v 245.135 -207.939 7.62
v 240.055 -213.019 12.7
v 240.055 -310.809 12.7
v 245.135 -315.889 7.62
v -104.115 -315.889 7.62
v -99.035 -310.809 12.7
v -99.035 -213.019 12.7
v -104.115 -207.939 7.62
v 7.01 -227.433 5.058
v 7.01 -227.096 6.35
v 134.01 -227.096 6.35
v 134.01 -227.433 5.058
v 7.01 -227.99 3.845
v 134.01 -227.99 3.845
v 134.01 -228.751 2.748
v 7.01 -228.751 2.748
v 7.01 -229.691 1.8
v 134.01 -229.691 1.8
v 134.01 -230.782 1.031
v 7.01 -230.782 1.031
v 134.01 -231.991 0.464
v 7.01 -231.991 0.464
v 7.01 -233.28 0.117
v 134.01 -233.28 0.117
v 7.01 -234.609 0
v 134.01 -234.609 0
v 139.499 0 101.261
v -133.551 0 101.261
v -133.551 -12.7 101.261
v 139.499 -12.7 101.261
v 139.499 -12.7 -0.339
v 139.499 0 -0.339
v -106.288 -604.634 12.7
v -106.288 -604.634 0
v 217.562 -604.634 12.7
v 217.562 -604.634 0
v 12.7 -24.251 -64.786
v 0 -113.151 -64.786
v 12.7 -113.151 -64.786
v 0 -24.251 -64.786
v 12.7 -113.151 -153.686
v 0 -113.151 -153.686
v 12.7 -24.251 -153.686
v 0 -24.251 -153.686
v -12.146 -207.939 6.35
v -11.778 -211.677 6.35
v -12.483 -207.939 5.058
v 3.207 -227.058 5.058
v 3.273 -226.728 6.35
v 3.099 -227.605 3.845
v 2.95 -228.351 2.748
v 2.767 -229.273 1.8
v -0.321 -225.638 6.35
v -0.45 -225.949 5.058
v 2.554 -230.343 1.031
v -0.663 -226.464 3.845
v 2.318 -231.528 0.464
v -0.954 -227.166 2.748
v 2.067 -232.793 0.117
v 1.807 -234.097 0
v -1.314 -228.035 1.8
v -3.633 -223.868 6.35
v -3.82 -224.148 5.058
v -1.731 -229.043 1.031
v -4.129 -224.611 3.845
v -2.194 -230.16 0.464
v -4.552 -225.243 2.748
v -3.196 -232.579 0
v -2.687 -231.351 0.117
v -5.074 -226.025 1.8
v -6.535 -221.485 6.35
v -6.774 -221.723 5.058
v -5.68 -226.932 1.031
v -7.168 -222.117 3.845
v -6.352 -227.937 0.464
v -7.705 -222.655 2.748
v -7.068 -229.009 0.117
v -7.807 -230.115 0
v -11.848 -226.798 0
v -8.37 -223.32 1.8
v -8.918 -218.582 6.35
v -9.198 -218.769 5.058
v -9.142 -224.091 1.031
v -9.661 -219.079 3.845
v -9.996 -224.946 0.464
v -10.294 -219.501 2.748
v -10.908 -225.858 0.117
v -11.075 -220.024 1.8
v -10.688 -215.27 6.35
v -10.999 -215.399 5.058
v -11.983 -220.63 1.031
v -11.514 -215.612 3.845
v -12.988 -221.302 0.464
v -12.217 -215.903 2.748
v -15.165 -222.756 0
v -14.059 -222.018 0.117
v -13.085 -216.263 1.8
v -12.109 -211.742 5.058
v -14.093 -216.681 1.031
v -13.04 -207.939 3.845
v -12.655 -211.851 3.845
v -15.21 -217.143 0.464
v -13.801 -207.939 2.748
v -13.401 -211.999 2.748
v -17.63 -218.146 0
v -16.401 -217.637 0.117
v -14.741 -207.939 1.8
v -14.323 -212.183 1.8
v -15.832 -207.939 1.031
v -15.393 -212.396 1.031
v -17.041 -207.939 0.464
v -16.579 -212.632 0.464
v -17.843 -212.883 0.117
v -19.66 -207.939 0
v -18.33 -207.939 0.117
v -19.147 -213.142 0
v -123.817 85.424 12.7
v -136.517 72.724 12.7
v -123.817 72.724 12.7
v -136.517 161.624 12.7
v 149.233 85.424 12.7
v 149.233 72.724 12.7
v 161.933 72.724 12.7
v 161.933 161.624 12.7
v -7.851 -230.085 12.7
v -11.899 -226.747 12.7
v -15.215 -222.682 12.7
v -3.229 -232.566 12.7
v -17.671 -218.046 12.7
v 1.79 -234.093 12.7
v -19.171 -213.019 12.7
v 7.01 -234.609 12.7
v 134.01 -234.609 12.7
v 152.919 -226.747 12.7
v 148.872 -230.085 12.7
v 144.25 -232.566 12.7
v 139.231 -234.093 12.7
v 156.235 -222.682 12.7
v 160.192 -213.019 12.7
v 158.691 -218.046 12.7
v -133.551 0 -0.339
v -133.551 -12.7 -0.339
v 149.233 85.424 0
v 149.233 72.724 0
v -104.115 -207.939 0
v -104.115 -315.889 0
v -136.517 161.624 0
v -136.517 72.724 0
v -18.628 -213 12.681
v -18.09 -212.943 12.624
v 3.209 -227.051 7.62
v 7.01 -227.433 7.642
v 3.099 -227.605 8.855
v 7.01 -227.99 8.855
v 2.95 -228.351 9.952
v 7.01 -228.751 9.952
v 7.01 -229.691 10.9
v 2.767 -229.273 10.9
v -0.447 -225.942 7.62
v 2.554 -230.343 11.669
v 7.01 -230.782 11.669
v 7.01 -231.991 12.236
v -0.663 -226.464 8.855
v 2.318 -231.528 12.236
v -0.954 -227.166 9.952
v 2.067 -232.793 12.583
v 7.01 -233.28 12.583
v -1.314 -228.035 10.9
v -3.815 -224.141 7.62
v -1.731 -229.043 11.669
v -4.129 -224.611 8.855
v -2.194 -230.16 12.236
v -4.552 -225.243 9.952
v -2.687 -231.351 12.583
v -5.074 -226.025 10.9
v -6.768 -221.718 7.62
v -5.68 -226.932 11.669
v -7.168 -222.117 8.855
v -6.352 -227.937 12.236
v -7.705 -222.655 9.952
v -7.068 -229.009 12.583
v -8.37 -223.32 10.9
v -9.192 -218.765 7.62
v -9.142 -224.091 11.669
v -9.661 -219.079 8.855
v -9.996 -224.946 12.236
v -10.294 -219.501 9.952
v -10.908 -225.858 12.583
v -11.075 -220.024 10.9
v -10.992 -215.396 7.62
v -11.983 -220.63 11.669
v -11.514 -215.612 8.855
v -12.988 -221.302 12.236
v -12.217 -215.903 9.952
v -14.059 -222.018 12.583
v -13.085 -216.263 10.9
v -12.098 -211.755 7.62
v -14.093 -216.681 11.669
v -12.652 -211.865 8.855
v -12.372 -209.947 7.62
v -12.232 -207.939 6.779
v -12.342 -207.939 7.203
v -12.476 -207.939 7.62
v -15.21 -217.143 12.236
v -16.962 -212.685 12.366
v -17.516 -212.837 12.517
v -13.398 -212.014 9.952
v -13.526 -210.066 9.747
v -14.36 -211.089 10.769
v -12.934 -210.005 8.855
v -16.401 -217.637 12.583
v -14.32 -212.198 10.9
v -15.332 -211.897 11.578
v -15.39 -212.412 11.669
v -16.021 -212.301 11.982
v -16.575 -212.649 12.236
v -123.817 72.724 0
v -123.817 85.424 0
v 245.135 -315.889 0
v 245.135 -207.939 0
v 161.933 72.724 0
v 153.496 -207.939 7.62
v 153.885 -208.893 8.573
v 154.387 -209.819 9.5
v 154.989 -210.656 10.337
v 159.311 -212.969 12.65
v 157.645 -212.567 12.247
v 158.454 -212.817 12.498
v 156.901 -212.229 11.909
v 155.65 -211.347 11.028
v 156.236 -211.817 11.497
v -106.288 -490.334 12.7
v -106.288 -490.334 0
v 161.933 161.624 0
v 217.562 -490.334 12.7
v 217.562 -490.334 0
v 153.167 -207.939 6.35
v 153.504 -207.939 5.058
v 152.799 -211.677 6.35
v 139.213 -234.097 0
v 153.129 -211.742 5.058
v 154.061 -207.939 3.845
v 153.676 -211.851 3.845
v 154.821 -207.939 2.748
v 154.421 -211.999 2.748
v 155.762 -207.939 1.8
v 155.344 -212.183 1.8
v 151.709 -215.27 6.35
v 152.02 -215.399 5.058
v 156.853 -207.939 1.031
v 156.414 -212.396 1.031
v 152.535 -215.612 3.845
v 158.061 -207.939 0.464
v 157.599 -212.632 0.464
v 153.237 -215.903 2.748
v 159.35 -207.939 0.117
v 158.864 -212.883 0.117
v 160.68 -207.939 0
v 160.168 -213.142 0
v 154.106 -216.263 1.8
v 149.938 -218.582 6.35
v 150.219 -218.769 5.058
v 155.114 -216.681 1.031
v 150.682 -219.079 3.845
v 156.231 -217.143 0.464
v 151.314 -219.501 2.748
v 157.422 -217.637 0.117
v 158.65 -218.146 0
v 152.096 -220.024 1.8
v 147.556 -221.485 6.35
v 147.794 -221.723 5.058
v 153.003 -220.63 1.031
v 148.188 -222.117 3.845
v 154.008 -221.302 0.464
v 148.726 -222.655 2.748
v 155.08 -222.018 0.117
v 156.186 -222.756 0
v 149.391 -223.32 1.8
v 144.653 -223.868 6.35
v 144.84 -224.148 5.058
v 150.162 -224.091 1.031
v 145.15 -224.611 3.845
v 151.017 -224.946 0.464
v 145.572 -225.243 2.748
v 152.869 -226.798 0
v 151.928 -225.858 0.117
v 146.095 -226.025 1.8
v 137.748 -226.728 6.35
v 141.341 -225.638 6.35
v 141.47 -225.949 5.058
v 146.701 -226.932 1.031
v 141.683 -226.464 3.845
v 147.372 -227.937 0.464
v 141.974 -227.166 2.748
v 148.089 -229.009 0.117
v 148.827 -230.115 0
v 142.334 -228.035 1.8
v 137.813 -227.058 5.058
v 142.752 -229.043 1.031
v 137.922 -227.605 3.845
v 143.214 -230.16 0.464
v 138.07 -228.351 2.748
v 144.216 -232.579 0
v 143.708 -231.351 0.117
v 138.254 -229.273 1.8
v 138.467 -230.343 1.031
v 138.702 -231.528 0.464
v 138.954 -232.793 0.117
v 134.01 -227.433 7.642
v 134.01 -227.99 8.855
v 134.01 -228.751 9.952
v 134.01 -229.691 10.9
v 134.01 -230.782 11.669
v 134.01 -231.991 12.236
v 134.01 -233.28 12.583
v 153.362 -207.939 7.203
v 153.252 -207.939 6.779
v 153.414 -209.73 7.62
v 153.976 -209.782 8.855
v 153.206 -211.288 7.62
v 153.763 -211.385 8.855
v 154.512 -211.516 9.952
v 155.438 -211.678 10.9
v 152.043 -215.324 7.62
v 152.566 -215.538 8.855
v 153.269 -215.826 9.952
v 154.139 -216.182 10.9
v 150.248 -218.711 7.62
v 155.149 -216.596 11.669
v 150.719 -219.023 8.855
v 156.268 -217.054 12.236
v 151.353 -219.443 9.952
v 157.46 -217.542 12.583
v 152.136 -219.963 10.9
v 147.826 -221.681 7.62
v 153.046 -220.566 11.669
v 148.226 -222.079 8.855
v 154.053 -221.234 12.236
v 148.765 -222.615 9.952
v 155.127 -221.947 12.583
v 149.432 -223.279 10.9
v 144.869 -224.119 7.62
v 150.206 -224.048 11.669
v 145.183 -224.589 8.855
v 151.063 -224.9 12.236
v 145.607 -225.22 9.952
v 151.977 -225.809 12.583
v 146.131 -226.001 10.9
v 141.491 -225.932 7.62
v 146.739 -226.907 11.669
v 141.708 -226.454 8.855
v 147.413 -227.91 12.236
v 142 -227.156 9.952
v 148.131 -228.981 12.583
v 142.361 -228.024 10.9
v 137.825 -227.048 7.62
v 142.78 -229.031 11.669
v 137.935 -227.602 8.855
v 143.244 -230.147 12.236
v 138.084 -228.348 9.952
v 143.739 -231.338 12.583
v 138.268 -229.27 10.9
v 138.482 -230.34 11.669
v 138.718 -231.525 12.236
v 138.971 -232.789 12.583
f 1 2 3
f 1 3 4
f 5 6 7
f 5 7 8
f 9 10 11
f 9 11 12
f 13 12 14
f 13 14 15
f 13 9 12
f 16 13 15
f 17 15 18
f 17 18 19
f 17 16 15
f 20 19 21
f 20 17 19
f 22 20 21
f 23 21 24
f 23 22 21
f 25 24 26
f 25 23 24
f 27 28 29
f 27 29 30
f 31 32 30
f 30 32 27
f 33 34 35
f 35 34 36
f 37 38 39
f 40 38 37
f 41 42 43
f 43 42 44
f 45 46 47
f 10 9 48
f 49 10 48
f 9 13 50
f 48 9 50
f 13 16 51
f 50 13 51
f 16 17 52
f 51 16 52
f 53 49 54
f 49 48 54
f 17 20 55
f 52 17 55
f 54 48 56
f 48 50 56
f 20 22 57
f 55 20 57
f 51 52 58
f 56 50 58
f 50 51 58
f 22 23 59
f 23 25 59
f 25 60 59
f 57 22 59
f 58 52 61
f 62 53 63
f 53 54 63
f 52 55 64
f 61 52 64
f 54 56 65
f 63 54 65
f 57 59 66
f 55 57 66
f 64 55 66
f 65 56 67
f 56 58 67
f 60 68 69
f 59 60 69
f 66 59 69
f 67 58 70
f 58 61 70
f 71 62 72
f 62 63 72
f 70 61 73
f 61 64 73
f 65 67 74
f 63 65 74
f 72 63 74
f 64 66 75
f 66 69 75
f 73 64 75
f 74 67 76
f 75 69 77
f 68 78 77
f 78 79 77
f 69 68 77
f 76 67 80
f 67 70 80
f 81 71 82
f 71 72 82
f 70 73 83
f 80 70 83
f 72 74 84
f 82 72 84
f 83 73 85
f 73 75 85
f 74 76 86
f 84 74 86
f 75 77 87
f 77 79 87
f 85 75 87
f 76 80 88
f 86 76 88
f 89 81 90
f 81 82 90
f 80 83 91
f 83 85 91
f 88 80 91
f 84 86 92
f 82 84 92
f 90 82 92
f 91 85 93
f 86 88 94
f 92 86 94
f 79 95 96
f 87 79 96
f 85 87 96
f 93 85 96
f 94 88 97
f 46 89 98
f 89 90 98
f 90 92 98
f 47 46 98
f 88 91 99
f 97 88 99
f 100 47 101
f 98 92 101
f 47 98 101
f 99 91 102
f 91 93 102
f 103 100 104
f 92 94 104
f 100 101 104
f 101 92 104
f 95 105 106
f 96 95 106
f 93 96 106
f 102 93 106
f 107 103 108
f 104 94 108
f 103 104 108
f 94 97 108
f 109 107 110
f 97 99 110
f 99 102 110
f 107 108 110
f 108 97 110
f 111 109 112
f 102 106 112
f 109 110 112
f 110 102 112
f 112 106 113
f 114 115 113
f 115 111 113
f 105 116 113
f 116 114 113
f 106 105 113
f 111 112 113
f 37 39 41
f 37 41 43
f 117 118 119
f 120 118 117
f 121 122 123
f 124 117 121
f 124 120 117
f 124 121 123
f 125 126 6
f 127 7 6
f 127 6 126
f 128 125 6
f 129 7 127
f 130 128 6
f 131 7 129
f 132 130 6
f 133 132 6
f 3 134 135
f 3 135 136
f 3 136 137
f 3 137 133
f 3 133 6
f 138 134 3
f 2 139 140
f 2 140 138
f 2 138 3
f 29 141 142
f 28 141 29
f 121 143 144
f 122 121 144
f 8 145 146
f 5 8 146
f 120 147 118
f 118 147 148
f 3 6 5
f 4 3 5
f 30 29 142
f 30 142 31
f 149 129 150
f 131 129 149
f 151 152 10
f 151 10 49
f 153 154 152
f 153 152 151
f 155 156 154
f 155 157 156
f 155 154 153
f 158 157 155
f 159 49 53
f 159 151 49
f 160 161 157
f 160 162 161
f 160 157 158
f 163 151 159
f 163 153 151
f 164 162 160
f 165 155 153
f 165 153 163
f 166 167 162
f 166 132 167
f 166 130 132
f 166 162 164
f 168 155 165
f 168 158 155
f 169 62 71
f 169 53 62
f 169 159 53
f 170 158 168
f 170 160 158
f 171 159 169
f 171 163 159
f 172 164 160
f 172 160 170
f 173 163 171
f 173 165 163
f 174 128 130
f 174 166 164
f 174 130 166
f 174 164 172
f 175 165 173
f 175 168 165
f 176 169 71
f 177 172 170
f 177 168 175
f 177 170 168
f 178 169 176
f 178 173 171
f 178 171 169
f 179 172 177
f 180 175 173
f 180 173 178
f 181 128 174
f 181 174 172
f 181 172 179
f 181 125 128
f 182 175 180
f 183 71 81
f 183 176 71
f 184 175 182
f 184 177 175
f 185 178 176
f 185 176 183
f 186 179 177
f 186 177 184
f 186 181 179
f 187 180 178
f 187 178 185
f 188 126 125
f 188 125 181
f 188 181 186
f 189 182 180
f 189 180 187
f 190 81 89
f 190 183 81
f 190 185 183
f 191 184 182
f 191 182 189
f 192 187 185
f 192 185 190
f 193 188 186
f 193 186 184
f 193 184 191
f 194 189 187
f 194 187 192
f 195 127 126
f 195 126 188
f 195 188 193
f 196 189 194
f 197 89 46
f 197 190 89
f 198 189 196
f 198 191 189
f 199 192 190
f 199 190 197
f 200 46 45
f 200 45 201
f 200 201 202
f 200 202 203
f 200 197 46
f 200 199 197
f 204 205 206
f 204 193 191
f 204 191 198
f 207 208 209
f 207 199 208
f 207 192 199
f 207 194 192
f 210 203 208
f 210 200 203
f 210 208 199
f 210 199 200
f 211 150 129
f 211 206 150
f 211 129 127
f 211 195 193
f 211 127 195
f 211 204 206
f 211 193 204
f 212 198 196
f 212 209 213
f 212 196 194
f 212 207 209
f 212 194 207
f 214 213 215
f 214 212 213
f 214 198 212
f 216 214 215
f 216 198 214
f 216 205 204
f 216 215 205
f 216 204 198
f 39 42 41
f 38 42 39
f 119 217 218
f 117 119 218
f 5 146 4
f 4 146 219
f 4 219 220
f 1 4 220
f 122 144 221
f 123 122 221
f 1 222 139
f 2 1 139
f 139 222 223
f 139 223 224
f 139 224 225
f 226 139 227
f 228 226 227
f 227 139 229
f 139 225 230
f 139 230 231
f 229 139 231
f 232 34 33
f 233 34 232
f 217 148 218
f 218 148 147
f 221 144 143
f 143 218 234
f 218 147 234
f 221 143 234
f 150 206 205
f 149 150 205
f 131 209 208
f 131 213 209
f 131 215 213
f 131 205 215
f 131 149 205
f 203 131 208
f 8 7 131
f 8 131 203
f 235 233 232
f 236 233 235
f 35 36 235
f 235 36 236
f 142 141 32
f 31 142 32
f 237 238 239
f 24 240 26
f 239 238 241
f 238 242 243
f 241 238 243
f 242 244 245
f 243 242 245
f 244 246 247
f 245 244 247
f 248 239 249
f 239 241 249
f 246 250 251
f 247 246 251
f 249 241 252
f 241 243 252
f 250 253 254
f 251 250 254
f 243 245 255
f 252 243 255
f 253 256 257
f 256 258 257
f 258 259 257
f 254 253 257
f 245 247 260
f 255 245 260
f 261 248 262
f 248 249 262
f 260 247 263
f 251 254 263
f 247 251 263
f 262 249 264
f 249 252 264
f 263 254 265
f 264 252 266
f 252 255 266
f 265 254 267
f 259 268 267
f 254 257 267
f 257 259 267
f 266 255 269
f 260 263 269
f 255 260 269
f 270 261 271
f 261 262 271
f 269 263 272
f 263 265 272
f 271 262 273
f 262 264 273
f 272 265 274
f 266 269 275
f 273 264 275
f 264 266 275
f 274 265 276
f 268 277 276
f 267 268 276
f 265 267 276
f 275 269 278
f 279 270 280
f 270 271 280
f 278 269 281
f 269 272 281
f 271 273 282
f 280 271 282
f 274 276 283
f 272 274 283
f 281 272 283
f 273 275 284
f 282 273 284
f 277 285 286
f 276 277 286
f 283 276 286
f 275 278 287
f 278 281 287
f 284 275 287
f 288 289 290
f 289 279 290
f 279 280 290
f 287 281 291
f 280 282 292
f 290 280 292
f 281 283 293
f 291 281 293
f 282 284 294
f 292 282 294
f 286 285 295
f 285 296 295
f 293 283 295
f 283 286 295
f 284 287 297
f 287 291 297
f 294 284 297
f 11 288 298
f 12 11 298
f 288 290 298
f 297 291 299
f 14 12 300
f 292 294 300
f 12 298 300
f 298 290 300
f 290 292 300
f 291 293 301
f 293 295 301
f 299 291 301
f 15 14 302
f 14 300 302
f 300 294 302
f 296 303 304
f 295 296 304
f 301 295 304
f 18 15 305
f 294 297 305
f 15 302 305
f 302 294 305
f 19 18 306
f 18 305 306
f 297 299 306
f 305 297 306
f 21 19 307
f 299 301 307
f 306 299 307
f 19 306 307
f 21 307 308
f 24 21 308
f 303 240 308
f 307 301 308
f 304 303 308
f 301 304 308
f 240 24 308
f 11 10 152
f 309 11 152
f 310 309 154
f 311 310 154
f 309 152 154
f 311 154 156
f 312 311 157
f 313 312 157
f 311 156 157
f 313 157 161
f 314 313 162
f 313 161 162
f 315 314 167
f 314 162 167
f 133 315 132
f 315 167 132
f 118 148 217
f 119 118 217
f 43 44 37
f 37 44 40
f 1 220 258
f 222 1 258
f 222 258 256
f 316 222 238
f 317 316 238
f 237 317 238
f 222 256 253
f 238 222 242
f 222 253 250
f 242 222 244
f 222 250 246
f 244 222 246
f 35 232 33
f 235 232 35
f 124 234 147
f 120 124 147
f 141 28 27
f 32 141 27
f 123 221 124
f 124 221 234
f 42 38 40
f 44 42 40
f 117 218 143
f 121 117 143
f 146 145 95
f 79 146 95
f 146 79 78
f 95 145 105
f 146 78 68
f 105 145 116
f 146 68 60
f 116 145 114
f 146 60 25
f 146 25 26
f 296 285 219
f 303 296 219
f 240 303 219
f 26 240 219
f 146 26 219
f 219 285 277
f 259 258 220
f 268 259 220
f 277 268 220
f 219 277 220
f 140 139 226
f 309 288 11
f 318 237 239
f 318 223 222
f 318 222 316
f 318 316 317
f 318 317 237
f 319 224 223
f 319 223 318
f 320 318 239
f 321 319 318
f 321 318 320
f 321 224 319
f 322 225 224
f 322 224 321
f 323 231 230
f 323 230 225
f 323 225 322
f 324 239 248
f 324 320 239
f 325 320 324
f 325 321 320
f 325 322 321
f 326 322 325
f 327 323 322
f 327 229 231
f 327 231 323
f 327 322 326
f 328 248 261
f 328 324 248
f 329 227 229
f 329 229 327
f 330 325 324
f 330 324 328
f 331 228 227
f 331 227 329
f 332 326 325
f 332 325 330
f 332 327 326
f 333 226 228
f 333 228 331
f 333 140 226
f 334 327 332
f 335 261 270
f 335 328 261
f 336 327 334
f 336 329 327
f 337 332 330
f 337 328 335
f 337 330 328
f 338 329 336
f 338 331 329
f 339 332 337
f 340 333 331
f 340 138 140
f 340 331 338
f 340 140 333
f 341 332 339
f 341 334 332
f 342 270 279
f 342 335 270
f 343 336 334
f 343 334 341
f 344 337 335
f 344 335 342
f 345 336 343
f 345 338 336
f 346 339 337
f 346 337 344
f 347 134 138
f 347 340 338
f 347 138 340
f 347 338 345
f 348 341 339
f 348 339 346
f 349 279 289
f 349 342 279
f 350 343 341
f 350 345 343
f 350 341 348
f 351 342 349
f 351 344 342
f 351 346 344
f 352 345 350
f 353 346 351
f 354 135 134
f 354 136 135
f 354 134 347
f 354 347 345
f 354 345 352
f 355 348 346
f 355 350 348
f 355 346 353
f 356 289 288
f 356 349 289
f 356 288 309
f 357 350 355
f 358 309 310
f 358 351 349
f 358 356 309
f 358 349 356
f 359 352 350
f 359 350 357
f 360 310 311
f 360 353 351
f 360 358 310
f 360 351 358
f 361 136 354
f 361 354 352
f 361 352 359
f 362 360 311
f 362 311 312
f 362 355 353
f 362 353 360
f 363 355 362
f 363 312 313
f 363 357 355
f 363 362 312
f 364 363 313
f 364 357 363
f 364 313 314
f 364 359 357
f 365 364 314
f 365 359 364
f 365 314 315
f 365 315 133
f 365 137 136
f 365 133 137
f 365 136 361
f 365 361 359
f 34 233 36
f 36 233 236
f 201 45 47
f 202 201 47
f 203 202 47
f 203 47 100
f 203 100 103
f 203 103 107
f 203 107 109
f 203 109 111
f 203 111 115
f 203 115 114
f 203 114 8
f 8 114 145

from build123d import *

# Parameters (mm, degrees)
F0_W         = 273.05
F0_H         = 101.6
F1_DEPTH     = 12.7
F3_DEPTH     = 12.7
F4_W         = 88.9
F4_H         = 88.9
F5_DEPTH     = 12.7
F7_DEPTH     = 12.7
F8_T1_DEPTH  = 127
F8_T4_ANGLE  = 147.318795695
F8_T6_ANGLE  = 147.318795695
F8_T8_ANGLE  = 147.318795695
F8_T10_ANGLE = 147.318795695
F9_T1_DEPTH  = 110.5832991577
F9_T3_DEPTH  = 134.0782991577
F9_T5_DEPTH  = 375.3782991577
F9_T7_DEPTH  = 110.5832991577
F10_W        = 323.85
F10_H        = 114.3
F11_DEPTH    = 12.7


# Not quite as in the source:
# - a fillet or chamfer that OpenCascade refuses, or shapes differently, is made with other operations: its cross-section is extruded or revolved along the edge and cut away or added


with BuildPart() as f1:
    # F0 (on Front) → F1 (new body)
    with BuildSketch(Plane.XZ):
        with Locations((2.9736794531, 50.4609997191)):
            Rectangle(F0_W, F0_H)
    extrude(amount=F1_DEPTH)


with BuildPart() as f3:
    # F2 (on Top) → F3 (new body)
    with BuildSketch(Plane.XY):
        Polygon((161.9328741789, 161.6237761021), (-136.5171258211, 161.6237761021), (-136.5171258211, 85.4237761021), (-136.5171258211, 72.7237761021), (-123.8171258211, 72.7237761021), (-123.8171258211, 85.4237761021), (149.2328741789, 85.4237761021), (149.2328741789, 72.7237761021), (161.9328741789, 72.7237761021), (161.9328741789, 85.4237761021), align=None)
    extrude(amount=F3_DEPTH)


with BuildPart() as f5:
    # F4 (on Right) → F5 (new body)
    with BuildSketch(Plane.YZ):
        with Locations((-68.700975406, -109.2356368899)):
            Rectangle(F4_W, F4_H)
    extrude(amount=F5_DEPTH)


with BuildPart() as f7:
    # F6 (on Top) → F7 (new body)
    with BuildSketch(Plane.XY):
        with BuildLine():
            Line((-12.0397317886, -207.9394155827), (-104.1147317886, -207.9394155827))
            Line((-104.1147317886, -207.9394155827), (-104.1147317886, -315.8894155827))
            Line((-104.1147317886, -315.8894155827), (245.1352682114, -315.8894155827))
            Line((245.1352682114, -315.8894155827), (245.1352682114, -207.9394155827))
            Line((245.1352682114, -207.9394155827), (153.0602682114, -207.9394155827))
            ThreePointArc((153.0602682114, -207.9394155827), (147.480652393, -221.4097997643), (134.0102682114, -226.9894155827))
            Line((134.0102682114, -226.9894155827), (7.0102682114, -226.9894155827))
            ThreePointArc((7.0102682114, -226.9894155827), (-6.4601159702, -221.4097997643), (-12.0397317886, -207.9394155827))
        make_face()
    extrude(amount=F7_DEPTH)

    # F8: fillet of radius 7.62 on 6 edges, made by hand

    # F8_s2 → F8_t1 (cut)
    with BuildSketch(Plane.YZ.offset(7.0102682114)):
        with BuildLine():
            ThreePointArc((-226.9894155827, 5.08), (-229.22126191, 10.4681536726), (-234.6094155827, 12.7))
            Line((-234.6094155827, 12.7), (-226.9894155827, 12.7))
            Line((-226.9894155827, 12.7), (-226.9894155827, 5.08))
        make_face()
        with BuildLine():
            ThreePointArc((-226.9894155827, 7.62), (-229.22126191, 2.2318463274), (-234.6094155827, 0))
            Line((-234.6094155827, 0), (-226.9894155827, 0))
            Line((-226.9894155827, 0), (-226.9894155827, 7.62))
        make_face()
    extrude(amount=F8_T1_DEPTH, mode=Mode.SUBTRACT)

    # F8_s3 → F8_t4 (revolve, cut)
    with BuildSketch(Plane(origin=(189.4426460264, -121.5322762083, 0), x_dir=(0, 0, 1), z_dir=(-0.8416879608, 0.5399642365, 0))):
        with BuildLine():
            ThreePointArc((7.62, -83.6093505), (2.2318463274, -81.3775041726), (0, -75.9893505))
            Line((0, -75.9893505), (0, -83.6093505))
            Line((0, -83.6093505), (7.62, -83.6093505))
        make_face()
    revolve(axis=Axis((134.0102682114, -207.9394155827, 0), (0, 0, -1)), revolution_arc=F8_T4_ANGLE, mode=Mode.SUBTRACT)

    # F8_s5 → F8_t6 (revolve, cut)
    with BuildSketch(Plane(origin=(189.4426460264, -121.5322762083, 0), x_dir=(0, 0, 1), z_dir=(-0.8416879608, 0.5399642365, 0))):
        with BuildLine():
            ThreePointArc((5.08, -83.6093505), (10.4681536726, -81.3775041726), (12.7, -75.9893505))
            Line((12.7, -75.9893505), (12.7, -83.6093505))
            Line((12.7, -83.6093505), (5.08, -83.6093505))
        make_face()
    revolve(axis=Axis((134.0102682114, -207.9394155827, 12.7), (0, 0, -1)), revolution_arc=F8_T6_ANGLE, mode=Mode.SUBTRACT)

    # F8_s7 → F8_t8 (revolve, cut)
    with BuildSketch(Plane.YZ.offset(7.0102682114)):
        with BuildLine():
            ThreePointArc((-226.9894155827, 7.62), (-229.22126191, 2.2318463274), (-234.6094155827, 0))
            Line((-234.6094155827, 0), (-226.9894155827, 0))
            Line((-226.9894155827, 0), (-226.9894155827, 7.62))
        make_face()
    revolve(axis=Axis((7.0102682114, -207.9394155827, 0), (0, 0, -1)), revolution_arc=F8_T8_ANGLE, mode=Mode.SUBTRACT)

    # F8_s9 → F8_t10 (revolve, cut)
    with BuildSketch(Plane.YZ.offset(7.0102682114)):
        with BuildLine():
            ThreePointArc((-226.9894155827, 5.08), (-229.22126191, 10.4681536726), (-234.6094155827, 12.7))
            Line((-234.6094155827, 12.7), (-226.9894155827, 12.7))
            Line((-226.9894155827, 12.7), (-226.9894155827, 5.08))
        make_face()
    revolve(axis=Axis((7.0102682114, -207.9394155827, 12.7), (0, 0, -1)), revolution_arc=F8_T10_ANGLE, mode=Mode.SUBTRACT)

    # F9: chamfer of 5.08 on 5 edges, made by hand

    # F9_s2 → F9_t1 (cut)
    with BuildSketch(Plane.YZ.offset(-117.1788813675)):
        Polygon((-213.0194155827, 12.7), (-207.9394155827, 7.62), (-207.9394155827, 12.7), align=None)
    extrude(amount=F9_T1_DEPTH, mode=Mode.SUBTRACT)

    # F9_s4 → F9_t3 (cut)
    with BuildSketch(Plane.XZ.offset(194.8752660038)):
        Polygon((-99.0347317886, 12.7), (-104.1147317886, 7.62), (-104.1147317886, 12.7), align=None)
        Polygon((240.0552682114, 12.7), (245.1352682114, 7.62), (245.1352682114, 12.7), align=None)
    extrude(amount=F9_T3_DEPTH, mode=Mode.SUBTRACT)

    # F9_s6 → F9_t5 (cut)
    with BuildSketch(Plane.YZ.offset(-117.1788813675)):
        Polygon((-310.8094155827, 12.7), (-315.8894155827, 7.62), (-315.8894155827, 12.7), align=None)
    extrude(amount=F9_T5_DEPTH, mode=Mode.SUBTRACT)

    # F9_s8 → F9_t7 (cut)
    with BuildSketch(Plane.YZ.offset(147.6161186325)):
        Polygon((-207.9394155827, 7.62), (-213.0194155827, 12.7), (-207.9394155827, 12.7), align=None)
    extrude(amount=F9_T7_DEPTH, mode=Mode.SUBTRACT)


with BuildPart() as f11:
    # F10 (on Top) → F11 (new body)
    with BuildSketch(Plane.XY):
        with Locations((55.6372515857, -547.4844523445)):
            Rectangle(F10_W, F10_H)
    extrude(amount=F11_DEPTH)


solid = Compound([f1.part, f3.part, f5.part, f7.part, f11.part])
